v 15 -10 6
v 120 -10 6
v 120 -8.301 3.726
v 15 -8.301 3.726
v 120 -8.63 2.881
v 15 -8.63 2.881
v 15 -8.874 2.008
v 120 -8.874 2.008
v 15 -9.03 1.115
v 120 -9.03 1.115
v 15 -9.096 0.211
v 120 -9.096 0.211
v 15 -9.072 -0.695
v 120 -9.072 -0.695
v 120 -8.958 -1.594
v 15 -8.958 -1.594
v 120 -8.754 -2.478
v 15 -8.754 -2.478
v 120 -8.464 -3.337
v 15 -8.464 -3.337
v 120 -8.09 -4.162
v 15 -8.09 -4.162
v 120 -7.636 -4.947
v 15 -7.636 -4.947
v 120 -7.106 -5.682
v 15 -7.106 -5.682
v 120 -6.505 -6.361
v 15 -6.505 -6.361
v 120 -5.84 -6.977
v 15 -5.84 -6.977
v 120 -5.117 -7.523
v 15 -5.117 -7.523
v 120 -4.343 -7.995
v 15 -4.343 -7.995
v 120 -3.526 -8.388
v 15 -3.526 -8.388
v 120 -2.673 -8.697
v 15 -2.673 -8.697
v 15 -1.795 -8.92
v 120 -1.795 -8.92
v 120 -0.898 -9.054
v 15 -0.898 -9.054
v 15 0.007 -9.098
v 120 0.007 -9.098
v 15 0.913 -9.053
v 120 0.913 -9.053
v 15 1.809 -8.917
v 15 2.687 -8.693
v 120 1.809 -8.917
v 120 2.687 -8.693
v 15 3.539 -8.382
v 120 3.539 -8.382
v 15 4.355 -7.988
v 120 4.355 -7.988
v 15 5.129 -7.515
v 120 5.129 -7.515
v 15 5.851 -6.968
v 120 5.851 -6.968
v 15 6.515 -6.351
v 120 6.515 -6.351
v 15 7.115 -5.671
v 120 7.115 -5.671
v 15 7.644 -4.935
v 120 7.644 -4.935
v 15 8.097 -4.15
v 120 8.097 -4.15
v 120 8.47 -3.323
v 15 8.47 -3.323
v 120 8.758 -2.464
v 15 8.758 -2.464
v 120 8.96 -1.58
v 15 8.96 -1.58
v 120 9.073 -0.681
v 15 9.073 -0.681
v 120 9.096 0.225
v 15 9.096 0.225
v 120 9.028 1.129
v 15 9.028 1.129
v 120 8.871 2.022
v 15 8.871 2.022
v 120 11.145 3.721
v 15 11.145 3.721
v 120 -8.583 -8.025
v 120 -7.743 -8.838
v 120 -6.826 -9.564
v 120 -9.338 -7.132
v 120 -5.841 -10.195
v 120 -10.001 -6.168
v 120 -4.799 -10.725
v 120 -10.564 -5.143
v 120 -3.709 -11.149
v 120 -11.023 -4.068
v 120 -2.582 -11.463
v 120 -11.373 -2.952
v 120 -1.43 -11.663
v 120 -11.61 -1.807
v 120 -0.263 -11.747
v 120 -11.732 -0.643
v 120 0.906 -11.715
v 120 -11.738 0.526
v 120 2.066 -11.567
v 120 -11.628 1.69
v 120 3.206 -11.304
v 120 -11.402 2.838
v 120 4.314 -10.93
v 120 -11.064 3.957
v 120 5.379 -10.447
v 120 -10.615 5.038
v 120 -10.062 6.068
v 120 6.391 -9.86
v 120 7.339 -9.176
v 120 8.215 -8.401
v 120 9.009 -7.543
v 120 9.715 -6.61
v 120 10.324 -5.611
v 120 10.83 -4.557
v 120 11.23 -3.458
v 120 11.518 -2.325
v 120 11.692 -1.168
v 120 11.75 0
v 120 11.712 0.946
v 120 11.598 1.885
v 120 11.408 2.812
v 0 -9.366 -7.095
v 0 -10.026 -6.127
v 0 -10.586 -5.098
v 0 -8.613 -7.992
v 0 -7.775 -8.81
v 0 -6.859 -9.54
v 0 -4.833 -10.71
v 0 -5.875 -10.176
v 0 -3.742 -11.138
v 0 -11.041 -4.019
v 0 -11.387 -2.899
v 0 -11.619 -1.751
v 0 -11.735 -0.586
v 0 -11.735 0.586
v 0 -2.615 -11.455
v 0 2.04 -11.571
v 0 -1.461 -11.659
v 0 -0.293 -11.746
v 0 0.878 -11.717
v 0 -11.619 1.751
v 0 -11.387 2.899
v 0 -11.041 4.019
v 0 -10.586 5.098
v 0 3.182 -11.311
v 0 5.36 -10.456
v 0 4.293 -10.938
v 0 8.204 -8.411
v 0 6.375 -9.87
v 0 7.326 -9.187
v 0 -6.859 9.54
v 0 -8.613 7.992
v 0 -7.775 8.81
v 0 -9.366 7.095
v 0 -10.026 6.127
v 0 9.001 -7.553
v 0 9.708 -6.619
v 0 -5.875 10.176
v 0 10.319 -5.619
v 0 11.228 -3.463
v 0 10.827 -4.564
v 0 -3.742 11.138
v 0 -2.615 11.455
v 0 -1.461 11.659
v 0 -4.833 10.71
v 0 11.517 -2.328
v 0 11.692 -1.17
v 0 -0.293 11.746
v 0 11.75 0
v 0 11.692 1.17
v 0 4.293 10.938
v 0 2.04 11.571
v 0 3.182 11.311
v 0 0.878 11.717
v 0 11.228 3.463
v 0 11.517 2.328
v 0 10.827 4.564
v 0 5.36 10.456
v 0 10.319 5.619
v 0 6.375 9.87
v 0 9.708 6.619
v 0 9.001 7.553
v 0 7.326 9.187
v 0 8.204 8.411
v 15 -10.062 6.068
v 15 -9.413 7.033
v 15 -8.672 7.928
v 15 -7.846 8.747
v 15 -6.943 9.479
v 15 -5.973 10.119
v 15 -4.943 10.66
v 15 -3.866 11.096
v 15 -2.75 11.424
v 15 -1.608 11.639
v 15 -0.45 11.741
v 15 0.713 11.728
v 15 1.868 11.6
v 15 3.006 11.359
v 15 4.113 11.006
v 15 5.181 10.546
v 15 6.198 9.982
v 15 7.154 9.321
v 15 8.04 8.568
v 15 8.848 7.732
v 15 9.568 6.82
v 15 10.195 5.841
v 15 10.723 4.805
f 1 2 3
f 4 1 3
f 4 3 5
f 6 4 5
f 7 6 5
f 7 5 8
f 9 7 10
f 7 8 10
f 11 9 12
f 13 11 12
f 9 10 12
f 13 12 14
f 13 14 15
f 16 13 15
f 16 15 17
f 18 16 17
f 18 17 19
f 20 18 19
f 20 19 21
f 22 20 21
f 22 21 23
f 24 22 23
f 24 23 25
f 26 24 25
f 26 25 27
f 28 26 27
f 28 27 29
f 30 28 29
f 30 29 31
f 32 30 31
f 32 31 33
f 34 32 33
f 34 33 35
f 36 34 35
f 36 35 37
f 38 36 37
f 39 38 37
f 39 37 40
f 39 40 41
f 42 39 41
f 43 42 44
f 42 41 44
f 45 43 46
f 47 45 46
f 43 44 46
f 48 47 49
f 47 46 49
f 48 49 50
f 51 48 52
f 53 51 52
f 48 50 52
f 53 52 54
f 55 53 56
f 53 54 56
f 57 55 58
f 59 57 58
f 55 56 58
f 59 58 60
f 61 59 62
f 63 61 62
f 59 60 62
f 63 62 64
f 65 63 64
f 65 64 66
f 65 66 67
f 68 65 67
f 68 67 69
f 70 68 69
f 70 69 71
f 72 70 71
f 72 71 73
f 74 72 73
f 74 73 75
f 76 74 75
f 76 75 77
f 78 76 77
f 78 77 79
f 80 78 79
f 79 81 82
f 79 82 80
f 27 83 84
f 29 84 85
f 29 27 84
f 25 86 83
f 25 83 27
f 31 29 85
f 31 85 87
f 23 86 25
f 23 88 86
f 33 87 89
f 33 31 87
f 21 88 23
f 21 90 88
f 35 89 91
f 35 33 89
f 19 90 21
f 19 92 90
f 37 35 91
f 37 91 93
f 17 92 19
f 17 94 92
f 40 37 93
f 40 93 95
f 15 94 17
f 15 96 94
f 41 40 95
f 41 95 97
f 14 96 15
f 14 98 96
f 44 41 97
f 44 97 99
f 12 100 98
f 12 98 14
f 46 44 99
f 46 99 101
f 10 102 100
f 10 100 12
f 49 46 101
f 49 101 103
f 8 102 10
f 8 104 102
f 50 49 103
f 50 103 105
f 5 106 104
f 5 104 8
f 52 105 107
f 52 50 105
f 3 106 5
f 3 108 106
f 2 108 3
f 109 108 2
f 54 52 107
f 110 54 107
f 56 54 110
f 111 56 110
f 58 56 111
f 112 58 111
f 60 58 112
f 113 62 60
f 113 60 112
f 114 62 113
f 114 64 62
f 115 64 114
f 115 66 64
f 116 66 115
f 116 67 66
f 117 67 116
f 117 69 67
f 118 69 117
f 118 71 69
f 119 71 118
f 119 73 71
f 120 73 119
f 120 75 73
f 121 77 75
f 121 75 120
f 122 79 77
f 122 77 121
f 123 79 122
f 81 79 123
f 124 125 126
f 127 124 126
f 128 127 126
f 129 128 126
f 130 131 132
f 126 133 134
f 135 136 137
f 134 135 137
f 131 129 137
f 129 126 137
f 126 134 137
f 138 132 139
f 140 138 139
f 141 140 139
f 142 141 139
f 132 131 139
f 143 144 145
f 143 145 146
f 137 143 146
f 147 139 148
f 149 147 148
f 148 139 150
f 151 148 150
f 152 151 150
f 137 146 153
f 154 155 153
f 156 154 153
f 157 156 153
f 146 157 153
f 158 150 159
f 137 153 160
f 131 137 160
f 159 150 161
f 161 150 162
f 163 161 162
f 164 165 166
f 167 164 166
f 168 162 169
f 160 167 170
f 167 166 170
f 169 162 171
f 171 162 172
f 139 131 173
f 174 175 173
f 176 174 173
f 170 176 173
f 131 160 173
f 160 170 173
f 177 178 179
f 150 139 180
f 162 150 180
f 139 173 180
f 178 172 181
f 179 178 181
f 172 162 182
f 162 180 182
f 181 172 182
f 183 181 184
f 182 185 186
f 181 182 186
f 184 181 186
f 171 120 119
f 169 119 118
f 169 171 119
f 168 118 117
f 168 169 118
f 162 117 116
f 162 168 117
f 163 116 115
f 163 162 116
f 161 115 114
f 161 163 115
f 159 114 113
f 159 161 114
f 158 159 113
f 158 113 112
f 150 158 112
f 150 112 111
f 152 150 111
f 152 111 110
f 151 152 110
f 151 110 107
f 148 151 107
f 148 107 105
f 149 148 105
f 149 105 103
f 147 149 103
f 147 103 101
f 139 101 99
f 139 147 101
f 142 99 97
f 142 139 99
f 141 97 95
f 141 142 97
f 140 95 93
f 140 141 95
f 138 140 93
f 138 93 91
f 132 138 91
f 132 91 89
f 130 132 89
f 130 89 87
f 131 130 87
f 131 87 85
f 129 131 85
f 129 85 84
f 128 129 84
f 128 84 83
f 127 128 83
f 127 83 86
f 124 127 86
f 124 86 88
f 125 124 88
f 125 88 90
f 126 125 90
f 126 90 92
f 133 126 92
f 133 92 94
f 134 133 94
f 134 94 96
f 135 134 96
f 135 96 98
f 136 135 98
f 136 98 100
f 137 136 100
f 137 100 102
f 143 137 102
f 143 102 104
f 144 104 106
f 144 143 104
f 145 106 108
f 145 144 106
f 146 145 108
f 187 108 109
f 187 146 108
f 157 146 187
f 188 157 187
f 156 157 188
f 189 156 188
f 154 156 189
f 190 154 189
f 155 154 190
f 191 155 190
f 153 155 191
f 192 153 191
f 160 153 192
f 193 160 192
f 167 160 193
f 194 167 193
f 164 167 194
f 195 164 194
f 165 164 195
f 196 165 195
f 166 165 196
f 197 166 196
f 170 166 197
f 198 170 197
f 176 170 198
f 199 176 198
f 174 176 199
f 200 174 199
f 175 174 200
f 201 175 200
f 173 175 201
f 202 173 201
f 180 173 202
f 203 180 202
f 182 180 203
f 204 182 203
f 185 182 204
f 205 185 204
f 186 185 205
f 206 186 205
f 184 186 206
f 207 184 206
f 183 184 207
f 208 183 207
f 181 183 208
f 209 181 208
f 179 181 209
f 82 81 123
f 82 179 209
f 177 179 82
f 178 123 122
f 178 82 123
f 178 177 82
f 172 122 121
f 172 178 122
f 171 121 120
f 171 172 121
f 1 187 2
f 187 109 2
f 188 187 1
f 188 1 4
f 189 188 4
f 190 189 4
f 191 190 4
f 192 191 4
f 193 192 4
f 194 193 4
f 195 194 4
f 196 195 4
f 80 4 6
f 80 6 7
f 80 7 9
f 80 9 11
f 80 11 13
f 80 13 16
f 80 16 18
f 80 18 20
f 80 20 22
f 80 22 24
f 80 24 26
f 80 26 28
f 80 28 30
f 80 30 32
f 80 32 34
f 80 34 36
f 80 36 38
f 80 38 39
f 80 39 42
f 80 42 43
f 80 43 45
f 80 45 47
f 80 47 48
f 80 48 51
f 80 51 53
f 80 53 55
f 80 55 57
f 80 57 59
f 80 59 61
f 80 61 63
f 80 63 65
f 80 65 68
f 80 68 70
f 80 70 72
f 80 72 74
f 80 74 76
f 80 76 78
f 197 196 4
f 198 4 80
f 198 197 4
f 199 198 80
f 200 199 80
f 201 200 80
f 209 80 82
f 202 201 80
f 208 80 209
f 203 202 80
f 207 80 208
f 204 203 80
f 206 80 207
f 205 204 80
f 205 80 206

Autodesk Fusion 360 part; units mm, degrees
sketch "Esboço1" plane through (0, 0, 0) normal (1, 0, 0) x (0, 1, 0)
  circle A0 centre (0, 0) radius 11.75
  dimension "d1" = 23.5
extrude "Extrusão1" add sketch "Esboço1" along normal blind 120
sketch "Esboço2" plane through (120, 0, 0) normal (1, 0, 0) x (0, 1, 0)
  circle A0 centre (0, 0) radius 11.75
sketch "Esboço3" plane through (120, 0, 0) normal (1, 0, 0) x (0, 1, 0)
  line L0 (-10, 6) -> (-8.3006, 3.7257)
  line L1 (11.1508, 3.7257) -> (8.8709, 2.0221)
  arc A0 (-8.3006, 3.7257) -> (8.8709, 2.0221) centre (0, 0) ccw
  line L2 (-10.8021, 6.8786) -> (-10, 6)
  line L3 (11.8471, 4.8629) -> (11.1508, 3.7257)
  arc A1 (11.8471, 4.8629) -> (-10.8021, 6.8786) centre (0, 0) ccw
  arc A2 (-10.062, 6.0679) -> (11.1451, 3.7214) centre (0, 0) ccw
  dimension "d4" = 23.5
extrude "Extrusão2" cut sketch "Esboço3" against normal blind 105 contours L0 L1 A0 L2 L3 A1
